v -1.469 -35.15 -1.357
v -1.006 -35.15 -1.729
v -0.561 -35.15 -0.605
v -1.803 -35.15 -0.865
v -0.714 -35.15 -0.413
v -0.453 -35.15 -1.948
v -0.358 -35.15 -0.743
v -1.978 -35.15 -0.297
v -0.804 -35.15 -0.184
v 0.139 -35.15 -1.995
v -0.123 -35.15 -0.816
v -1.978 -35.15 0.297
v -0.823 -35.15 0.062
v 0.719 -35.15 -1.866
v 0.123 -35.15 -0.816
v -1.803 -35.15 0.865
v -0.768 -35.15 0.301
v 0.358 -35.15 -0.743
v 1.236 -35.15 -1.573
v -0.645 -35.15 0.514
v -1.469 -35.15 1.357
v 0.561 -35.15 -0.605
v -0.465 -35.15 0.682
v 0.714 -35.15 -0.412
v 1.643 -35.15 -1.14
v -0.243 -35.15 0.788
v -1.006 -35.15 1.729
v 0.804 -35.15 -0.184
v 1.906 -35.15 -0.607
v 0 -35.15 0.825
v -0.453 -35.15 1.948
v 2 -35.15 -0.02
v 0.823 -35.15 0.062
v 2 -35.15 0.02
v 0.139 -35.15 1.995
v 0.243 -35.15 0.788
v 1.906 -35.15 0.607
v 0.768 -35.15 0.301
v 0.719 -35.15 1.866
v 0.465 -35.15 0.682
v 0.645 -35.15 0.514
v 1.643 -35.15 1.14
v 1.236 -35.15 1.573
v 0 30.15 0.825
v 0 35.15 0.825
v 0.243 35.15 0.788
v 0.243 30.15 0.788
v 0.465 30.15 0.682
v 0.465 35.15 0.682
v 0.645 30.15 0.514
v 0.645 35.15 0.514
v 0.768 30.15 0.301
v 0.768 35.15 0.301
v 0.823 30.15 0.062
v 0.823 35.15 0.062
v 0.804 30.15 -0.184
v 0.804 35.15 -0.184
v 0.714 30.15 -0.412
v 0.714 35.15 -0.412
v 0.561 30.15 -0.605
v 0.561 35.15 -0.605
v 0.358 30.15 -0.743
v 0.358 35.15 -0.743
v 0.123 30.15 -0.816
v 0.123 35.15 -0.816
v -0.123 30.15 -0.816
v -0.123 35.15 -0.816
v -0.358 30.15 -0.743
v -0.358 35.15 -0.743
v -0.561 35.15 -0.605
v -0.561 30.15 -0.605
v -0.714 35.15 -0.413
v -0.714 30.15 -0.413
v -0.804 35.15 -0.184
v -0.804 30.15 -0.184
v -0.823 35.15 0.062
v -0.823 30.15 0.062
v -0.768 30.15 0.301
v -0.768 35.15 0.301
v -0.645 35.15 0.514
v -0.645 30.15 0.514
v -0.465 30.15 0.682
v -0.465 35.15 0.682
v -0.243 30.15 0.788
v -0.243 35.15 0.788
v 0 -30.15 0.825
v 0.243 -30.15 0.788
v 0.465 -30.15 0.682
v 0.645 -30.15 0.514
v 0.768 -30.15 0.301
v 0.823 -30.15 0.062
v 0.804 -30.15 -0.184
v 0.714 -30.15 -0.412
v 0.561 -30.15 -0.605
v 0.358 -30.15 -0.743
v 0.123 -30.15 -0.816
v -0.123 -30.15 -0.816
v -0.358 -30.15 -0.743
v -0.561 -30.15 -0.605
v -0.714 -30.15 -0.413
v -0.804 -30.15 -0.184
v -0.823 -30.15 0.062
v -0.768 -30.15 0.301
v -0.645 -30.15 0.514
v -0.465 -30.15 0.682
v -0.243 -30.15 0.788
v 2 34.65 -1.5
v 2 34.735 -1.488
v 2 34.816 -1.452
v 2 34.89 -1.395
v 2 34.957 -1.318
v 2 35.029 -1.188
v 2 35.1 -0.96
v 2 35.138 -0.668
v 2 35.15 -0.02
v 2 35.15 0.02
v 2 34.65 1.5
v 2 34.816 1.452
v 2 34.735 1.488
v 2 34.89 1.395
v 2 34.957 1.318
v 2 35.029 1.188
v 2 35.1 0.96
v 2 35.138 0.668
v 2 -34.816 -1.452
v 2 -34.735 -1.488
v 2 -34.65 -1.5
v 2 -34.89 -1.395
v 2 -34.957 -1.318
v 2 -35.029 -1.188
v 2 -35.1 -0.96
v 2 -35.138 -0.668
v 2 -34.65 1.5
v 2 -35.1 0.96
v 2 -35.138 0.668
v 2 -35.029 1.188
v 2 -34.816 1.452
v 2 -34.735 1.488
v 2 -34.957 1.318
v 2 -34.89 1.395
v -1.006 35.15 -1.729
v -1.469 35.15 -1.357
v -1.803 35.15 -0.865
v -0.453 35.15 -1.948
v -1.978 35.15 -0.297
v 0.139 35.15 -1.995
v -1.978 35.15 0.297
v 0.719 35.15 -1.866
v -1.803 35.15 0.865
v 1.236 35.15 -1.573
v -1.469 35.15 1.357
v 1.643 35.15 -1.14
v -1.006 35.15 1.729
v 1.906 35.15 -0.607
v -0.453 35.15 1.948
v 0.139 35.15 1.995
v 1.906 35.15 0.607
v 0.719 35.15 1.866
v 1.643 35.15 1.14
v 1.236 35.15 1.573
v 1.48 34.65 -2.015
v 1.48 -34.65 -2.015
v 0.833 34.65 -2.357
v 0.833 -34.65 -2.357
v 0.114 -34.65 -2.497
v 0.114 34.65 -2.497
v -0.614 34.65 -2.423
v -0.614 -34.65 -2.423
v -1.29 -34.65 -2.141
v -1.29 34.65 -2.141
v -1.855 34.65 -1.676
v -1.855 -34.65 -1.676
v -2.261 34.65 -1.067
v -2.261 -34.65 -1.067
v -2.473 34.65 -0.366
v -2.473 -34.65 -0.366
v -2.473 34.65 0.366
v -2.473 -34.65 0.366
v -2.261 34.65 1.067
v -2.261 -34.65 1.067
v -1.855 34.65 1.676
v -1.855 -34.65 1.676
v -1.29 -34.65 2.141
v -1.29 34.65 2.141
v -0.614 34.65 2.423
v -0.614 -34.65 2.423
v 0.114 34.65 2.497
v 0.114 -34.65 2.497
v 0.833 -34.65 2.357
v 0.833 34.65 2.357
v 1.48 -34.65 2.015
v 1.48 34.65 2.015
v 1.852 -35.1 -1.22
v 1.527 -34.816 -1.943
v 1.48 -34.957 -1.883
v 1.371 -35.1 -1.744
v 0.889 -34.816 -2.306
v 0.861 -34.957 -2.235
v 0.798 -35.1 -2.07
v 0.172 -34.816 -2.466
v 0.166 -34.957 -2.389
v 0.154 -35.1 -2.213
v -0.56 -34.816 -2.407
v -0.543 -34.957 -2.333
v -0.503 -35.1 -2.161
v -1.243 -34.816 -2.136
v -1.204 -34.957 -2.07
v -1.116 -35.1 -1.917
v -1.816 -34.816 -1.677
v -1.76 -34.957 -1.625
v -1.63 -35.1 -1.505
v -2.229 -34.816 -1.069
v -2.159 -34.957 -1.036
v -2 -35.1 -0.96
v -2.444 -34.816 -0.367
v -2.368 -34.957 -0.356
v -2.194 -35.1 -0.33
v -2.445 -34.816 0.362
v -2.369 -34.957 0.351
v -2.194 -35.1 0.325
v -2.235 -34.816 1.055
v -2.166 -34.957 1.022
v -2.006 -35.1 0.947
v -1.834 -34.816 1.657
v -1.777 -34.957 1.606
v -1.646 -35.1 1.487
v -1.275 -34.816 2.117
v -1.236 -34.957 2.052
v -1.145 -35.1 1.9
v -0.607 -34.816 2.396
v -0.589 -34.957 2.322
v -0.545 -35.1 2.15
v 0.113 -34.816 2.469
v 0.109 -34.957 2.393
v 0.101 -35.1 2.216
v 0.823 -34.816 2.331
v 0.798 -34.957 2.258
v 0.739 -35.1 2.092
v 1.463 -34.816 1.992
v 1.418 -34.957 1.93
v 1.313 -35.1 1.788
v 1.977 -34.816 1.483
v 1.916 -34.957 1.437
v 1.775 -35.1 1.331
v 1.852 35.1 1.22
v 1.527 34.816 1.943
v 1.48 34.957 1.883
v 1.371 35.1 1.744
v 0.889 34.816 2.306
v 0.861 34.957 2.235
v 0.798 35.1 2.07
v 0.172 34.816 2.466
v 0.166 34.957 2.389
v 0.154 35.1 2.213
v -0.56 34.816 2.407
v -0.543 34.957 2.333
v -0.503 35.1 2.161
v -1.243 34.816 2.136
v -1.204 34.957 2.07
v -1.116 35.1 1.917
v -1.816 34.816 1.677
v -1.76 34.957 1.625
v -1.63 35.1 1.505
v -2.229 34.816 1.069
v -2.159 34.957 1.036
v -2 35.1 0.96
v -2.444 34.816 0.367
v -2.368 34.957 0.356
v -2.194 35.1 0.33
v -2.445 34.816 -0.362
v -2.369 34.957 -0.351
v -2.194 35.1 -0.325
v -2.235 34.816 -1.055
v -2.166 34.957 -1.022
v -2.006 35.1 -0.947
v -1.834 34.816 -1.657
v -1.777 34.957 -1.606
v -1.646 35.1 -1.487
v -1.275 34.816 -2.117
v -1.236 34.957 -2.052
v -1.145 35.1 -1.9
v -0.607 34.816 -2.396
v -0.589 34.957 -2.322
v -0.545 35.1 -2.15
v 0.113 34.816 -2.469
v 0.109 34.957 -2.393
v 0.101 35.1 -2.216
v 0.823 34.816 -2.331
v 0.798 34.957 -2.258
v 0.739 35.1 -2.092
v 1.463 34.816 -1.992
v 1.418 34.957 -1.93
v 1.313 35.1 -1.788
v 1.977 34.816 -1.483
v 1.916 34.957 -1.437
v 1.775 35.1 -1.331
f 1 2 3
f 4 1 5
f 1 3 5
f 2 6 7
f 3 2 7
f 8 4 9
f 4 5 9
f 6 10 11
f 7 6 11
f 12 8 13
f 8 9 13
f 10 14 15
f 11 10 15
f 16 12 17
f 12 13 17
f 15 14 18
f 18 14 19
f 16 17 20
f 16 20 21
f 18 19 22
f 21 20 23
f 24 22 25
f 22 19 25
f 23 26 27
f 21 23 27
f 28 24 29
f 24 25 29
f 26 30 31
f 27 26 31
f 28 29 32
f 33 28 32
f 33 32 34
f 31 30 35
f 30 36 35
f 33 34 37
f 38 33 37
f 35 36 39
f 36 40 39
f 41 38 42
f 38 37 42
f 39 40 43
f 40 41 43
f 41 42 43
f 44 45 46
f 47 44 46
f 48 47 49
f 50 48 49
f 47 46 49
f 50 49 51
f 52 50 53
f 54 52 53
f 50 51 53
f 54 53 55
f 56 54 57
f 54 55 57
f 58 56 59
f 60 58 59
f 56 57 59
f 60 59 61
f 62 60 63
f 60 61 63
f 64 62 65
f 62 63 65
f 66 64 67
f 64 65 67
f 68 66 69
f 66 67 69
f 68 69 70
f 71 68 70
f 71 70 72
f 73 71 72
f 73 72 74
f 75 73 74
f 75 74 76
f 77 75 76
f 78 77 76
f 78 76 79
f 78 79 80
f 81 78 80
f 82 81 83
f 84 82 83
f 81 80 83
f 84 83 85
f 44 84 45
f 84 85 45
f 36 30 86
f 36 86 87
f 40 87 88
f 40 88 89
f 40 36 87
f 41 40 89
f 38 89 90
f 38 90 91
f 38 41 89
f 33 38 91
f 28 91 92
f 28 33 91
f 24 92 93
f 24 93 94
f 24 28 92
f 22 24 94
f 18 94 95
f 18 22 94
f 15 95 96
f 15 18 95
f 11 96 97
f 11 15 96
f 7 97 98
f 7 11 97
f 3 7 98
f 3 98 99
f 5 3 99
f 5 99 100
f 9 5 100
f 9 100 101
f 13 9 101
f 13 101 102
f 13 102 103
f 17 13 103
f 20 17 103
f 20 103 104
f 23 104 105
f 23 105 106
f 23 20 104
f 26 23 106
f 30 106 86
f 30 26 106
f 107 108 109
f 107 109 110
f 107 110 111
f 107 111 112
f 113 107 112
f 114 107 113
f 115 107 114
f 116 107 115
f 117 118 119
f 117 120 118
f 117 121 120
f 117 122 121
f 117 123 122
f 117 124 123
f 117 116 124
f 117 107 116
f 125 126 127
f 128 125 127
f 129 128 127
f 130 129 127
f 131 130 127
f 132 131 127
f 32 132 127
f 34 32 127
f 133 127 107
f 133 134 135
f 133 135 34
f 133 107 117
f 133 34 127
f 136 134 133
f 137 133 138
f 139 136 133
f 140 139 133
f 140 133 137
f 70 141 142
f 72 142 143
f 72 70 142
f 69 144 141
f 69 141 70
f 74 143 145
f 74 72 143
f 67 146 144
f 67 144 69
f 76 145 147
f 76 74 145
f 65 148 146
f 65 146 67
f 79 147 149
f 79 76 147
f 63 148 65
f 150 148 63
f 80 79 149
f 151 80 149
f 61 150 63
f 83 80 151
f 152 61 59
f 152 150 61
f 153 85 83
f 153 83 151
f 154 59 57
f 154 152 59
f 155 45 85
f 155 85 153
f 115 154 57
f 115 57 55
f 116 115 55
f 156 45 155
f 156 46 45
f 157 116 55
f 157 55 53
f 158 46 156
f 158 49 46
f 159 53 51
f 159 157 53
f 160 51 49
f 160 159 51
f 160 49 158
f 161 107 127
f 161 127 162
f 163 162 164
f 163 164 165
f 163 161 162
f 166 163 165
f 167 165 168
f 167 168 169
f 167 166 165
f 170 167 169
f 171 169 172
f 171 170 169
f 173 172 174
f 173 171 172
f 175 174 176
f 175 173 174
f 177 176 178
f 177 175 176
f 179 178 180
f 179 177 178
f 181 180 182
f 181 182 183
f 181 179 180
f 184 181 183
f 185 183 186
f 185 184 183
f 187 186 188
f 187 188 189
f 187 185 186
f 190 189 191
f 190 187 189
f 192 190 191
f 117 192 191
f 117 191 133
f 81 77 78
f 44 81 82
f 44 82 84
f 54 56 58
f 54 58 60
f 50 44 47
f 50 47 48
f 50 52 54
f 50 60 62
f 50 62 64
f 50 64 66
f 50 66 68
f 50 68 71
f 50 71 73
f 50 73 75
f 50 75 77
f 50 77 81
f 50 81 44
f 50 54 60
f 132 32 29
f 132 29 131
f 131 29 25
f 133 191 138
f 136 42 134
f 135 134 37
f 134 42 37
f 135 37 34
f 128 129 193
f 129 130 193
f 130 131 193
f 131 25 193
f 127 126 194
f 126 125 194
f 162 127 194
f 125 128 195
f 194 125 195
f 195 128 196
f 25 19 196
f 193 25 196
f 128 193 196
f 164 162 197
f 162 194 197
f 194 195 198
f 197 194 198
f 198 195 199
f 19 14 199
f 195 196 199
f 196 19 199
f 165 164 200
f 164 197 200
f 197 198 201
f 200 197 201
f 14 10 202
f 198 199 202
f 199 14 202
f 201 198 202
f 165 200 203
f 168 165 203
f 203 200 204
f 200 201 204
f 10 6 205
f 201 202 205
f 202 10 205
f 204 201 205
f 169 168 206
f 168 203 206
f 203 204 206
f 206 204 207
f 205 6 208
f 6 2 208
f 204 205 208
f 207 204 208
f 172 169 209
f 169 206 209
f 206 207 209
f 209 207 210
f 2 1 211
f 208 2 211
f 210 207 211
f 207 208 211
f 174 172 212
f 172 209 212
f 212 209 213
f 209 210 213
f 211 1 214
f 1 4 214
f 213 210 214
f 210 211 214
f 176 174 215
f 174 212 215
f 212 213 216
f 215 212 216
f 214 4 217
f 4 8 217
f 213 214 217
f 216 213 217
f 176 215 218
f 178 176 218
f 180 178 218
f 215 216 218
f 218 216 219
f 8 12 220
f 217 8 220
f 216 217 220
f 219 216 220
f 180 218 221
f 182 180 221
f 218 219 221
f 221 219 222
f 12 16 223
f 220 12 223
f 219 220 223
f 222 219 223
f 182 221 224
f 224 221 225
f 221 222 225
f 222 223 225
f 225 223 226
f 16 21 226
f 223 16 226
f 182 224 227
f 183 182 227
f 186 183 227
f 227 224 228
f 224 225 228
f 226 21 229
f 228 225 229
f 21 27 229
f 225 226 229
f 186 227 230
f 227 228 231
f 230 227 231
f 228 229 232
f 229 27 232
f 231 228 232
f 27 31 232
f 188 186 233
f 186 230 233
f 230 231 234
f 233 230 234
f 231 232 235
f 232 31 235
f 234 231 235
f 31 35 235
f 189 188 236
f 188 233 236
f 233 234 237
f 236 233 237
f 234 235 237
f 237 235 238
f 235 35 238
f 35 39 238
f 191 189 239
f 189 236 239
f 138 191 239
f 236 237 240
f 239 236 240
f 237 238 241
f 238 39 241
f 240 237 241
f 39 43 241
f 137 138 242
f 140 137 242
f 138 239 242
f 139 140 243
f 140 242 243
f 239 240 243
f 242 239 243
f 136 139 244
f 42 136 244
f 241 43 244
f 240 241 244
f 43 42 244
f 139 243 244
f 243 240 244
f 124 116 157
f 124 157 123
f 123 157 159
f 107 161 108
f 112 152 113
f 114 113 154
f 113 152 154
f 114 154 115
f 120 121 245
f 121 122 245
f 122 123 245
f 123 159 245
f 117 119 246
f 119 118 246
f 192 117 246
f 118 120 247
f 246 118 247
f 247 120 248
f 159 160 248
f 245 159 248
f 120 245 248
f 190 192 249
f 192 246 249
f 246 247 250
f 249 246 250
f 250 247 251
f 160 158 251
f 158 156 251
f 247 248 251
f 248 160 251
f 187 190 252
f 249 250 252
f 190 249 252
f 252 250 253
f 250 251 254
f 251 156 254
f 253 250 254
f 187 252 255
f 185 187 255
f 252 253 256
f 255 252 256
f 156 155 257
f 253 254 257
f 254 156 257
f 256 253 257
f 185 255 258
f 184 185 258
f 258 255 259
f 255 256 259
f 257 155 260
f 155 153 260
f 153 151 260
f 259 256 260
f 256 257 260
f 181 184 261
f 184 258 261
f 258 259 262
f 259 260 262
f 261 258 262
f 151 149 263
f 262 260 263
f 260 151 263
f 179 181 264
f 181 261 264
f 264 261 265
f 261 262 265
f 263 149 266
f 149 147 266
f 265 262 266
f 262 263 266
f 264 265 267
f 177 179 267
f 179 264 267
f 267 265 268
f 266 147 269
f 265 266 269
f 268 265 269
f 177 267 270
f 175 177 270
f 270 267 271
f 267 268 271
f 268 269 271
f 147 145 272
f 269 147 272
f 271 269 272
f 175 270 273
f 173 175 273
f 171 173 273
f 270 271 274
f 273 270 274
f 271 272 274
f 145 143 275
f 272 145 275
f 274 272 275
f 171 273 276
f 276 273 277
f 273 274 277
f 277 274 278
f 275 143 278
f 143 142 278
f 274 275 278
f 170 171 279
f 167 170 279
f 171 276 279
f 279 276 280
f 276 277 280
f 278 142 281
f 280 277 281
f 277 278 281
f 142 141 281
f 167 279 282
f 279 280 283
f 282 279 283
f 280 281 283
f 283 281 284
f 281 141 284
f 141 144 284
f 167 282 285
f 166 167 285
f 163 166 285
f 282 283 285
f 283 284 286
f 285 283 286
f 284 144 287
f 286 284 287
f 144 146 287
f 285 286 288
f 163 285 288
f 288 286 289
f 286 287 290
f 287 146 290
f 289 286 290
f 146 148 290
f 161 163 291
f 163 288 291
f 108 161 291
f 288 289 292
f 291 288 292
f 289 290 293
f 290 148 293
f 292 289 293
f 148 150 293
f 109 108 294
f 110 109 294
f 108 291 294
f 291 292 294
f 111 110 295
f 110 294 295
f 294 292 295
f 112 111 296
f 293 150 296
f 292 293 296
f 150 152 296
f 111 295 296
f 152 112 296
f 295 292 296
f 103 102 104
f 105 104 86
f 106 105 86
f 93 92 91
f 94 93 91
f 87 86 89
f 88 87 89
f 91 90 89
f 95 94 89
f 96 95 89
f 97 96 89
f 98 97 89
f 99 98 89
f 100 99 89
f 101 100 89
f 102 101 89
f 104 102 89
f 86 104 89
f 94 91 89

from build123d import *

# Parameters (mm, degrees)
SKETCH1_R            = 2.5
BOSS_EXTRUDE1_DEPTH  = 35.15
SKETCH2_R            = 0.825
CUT_EXTRUDE1_DEPTH   = 5
CUT_EXTRUDE2_DEPTH   = 36.327361917
FILLET1_R            = 0.5
FILLET1_OF_MIRROR1_R = 0.5


with BuildPart() as part:
    # Sketch1 → Boss-Extrude1 (new body)
    with BuildSketch(Plane(origin=(0, 0, 0), x_dir=(1, 0, 0), z_dir=(0, 1, 0))):
        with Locations(Location((0, 0, 0), (0, 0, 270))):
            Circle(SKETCH1_R)
    boss_extrude1 = extrude(amount=BOSS_EXTRUDE1_DEPTH)

    # Sketch2 → Cut-Extrude1 (cut)
    with BuildSketch(Plane(origin=(0, 35.15, 0), x_dir=(1, 0, 0), z_dir=(0, 1, 0))):
        with Locations(Location((0, 0, 0), (0, 0, 270))):
            Circle(SKETCH2_R)
    cut_extrude1 = extrude(amount=-CUT_EXTRUDE1_DEPTH, mode=Mode.SUBTRACT)

    # Sketch3 → Cut-Extrude2 (cut, through all)
    with BuildSketch(Plane(origin=(0, 35.15, 0), x_dir=(1, 0, 0), z_dir=(0, 1, 0))):
        with BuildLine():
            Line((2, 1.5), (2, -1.5))
            ThreePointArc((2, -1.5), (2.5, 0), (2, 1.5))
        make_face()
    cut_extrude2 = extrude(amount=-CUT_EXTRUDE2_DEPTH, mode=Mode.SUBTRACT)

    # Fillet1
    fillet1_edges = [part.edges().sort_by_distance(p)[0] for p in [
        (-2.5, 35.15, 0),
    ]]
    fillet(fillet1_edges, radius=FILLET1_R - 0.0001)  # a hair under: the kernel refuses the full size

    # Mirror1: Boss-Extrude1, Cut-Extrude1, Cut-Extrude2 across plane
    add(boss_extrude1.mirror(Plane.ZX))
    add(cut_extrude1.mirror(Plane.ZX), mode=Mode.SUBTRACT)
    add(cut_extrude2.mirror(Plane.ZX), mode=Mode.SUBTRACT)

    # Fillet1 of Mirror1
    fillet1_of_mirror1_edges = [part.edges().sort_by_distance(p)[0] for p in [
        (-2.5, -35.15, 0),
    ]]
    fillet(fillet1_of_mirror1_edges, radius=FILLET1_OF_MIRROR1_R - 0.0001)  # a hair under: the kernel refuses the full size


solid = part.part
